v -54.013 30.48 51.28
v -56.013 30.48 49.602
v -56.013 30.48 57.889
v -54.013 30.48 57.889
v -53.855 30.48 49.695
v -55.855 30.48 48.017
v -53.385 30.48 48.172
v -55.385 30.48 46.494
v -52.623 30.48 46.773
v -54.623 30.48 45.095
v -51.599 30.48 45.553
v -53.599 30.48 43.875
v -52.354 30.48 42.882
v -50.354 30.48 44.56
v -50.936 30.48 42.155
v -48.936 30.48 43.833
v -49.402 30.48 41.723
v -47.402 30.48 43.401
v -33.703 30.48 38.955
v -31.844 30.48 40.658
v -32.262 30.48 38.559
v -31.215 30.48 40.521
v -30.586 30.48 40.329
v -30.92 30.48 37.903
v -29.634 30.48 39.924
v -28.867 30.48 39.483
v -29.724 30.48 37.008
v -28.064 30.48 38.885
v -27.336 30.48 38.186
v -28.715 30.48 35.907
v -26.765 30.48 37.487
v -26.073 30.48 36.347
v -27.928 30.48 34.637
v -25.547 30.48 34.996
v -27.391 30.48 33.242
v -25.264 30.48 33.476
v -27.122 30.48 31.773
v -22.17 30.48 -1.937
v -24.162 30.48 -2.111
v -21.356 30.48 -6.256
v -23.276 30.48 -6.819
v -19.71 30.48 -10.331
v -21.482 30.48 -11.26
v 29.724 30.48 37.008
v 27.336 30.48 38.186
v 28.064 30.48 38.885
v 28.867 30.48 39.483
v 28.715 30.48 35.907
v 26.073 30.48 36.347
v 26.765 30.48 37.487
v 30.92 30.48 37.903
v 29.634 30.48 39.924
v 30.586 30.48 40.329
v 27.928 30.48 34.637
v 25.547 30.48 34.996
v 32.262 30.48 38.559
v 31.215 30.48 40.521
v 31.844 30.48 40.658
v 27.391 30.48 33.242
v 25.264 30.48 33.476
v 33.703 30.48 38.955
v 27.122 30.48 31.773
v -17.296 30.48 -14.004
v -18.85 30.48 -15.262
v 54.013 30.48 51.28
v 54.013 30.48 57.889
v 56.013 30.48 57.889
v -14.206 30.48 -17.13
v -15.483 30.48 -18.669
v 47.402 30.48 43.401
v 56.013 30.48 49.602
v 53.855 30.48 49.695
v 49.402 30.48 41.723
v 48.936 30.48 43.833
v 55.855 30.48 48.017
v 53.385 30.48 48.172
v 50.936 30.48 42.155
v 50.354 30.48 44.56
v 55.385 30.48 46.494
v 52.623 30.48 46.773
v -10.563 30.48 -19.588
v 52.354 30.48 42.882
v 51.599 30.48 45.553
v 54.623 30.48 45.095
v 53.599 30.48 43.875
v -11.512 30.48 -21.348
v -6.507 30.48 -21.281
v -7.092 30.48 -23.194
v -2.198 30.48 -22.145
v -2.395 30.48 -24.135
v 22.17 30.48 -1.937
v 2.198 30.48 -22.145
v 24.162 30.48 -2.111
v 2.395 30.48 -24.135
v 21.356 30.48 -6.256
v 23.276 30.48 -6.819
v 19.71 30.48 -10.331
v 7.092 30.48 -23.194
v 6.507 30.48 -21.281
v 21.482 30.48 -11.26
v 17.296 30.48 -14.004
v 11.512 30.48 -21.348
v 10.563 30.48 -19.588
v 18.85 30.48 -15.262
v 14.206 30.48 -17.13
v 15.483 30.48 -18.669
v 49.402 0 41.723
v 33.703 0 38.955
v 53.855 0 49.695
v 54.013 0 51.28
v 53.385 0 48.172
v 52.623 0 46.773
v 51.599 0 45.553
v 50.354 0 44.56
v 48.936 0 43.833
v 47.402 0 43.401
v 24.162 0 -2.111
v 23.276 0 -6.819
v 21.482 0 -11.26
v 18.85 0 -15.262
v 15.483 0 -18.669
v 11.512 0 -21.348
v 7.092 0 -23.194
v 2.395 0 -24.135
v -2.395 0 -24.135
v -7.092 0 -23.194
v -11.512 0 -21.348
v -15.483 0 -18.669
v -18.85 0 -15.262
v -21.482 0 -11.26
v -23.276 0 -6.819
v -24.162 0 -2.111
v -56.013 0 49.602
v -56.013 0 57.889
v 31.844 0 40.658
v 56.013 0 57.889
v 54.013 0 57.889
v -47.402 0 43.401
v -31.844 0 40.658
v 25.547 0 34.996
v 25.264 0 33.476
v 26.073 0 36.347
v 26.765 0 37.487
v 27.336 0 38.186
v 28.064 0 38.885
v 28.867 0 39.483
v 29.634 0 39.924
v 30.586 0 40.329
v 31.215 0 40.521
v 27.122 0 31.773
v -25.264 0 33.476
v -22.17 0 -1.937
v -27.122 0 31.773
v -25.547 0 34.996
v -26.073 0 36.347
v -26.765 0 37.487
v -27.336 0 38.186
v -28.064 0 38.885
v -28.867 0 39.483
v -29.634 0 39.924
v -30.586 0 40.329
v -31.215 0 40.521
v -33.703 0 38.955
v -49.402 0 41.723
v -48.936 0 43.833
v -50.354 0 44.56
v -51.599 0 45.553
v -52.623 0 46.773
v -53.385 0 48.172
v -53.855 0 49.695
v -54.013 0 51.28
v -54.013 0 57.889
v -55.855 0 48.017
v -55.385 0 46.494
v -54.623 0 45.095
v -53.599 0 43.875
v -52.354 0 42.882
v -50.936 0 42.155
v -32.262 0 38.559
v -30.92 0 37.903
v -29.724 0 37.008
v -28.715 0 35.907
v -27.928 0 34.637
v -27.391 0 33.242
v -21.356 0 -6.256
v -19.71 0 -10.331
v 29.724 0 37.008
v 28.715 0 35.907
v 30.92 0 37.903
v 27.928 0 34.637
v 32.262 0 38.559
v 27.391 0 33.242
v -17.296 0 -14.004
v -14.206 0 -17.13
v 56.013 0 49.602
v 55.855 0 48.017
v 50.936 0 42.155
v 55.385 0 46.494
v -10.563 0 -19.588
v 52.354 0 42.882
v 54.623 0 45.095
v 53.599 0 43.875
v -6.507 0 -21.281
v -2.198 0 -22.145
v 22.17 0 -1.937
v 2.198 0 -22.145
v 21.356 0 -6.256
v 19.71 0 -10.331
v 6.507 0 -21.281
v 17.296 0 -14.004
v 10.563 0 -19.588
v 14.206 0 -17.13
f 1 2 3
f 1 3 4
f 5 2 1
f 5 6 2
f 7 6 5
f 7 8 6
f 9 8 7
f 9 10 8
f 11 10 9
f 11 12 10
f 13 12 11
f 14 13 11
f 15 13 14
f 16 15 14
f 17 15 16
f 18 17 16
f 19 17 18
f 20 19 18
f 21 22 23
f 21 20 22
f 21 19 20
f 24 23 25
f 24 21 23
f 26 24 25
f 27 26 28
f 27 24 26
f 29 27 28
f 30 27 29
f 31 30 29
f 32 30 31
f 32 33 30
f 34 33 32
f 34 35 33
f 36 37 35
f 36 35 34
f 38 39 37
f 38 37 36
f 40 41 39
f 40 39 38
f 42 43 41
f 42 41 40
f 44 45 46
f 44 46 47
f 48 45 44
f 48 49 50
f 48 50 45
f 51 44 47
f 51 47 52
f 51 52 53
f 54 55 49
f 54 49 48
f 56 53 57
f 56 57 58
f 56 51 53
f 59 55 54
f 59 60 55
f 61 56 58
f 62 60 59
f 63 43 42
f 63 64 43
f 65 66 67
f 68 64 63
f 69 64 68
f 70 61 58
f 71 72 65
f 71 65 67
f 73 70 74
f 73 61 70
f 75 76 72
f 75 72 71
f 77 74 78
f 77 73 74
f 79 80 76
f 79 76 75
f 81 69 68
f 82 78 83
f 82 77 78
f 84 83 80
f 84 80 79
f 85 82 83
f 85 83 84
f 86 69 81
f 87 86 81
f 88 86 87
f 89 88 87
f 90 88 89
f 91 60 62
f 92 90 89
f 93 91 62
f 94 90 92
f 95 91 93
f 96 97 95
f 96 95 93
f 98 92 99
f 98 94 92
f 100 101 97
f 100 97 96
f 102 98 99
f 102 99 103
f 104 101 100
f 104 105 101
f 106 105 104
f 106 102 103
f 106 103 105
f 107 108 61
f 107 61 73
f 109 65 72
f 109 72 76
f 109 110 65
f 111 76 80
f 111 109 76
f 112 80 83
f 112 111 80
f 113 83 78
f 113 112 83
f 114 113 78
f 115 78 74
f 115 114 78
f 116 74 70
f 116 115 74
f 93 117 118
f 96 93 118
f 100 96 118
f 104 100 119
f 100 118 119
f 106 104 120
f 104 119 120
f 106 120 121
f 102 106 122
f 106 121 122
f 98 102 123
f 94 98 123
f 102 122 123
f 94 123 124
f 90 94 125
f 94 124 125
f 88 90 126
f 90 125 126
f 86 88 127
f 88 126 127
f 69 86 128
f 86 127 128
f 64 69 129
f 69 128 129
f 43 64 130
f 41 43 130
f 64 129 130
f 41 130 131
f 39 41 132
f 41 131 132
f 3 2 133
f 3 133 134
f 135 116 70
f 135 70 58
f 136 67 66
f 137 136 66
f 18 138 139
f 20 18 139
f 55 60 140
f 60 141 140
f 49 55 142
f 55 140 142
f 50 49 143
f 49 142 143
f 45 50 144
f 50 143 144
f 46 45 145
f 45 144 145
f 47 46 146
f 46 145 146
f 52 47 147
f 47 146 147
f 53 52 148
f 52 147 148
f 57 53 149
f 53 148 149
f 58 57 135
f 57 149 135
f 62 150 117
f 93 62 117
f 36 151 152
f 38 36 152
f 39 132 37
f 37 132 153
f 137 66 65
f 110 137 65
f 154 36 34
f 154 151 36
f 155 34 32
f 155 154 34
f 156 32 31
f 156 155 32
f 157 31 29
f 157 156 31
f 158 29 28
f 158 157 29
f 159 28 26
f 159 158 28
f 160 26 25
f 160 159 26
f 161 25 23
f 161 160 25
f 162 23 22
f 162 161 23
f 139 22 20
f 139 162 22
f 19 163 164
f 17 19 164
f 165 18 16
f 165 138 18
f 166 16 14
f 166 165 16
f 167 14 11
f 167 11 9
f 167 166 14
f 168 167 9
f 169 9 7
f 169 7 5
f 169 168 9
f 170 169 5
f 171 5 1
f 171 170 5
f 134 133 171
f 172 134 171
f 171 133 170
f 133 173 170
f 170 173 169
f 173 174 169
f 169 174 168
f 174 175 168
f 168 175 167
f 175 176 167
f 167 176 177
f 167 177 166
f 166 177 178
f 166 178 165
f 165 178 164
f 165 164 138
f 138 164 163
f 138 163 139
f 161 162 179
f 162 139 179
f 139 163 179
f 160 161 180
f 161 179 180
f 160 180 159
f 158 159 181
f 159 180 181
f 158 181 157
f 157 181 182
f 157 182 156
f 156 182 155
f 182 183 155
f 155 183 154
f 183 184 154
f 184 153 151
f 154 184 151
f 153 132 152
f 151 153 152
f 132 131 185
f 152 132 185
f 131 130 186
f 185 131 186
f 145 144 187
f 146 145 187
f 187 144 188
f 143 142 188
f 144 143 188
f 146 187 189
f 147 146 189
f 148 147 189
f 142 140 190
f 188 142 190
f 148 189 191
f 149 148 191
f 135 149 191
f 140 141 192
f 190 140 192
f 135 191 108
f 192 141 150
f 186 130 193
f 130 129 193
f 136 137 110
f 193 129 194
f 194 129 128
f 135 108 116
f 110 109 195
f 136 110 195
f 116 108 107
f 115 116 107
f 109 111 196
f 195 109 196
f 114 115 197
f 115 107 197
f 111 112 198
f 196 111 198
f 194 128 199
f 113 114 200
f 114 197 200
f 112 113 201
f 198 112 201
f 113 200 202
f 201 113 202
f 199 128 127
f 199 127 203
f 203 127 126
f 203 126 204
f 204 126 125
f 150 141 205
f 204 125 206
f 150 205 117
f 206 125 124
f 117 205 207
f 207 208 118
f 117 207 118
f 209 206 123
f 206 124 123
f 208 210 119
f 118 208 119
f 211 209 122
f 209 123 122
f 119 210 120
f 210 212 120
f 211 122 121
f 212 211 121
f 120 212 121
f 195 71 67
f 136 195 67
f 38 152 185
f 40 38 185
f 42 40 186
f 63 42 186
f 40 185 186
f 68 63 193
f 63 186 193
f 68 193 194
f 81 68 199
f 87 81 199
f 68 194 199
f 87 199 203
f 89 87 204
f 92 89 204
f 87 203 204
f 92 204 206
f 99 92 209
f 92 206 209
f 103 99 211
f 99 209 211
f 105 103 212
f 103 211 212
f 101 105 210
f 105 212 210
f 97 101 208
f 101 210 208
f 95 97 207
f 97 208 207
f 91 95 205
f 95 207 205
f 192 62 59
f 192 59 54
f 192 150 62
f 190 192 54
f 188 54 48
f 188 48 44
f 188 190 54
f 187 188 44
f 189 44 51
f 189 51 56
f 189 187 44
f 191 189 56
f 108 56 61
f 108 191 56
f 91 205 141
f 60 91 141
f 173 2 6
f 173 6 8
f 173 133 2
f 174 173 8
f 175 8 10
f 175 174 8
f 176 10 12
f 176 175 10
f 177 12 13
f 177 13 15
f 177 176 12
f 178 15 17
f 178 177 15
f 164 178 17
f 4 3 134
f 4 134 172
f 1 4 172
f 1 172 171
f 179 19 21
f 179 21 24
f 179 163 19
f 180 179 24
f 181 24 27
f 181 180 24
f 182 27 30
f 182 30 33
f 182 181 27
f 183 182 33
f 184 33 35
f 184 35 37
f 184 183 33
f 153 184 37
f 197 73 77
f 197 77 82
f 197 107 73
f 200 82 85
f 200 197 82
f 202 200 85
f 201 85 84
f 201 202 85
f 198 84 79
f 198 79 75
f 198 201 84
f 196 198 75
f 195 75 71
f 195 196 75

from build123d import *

# Parameters (mm, degrees)
BOSS_EXTRUDE2_DEPTH = 30.48
BOSS_EXTRUDE3_DEPTH = 30.48
CUT_EXTRUDE2_DEPTH  = 87.125730482
FILLET1_R           = 8


with BuildPart() as part:
    # Sketch1 → Boss-Extrude2 (new body)
    with BuildSketch(Plane(origin=(0, 0, 0), x_dir=(1, 0, 0), z_dir=(0, 1, 0))):
        with BuildLine():
            ThreePointArc((-22.169540289, 1.937007843), (0, 22.254), (22.169540289, 1.937007843))
            Line((22.169540289, 1.937007843), (27.396679476, -57.888910388))
            Line((27.396679476, -57.888910388), (29.404298913, -57.888910388))
            Line((29.404298913, -57.888910388), (24.161949769, 2.111089612))
            ThreePointArc((24.161949769, 2.111089612), (0, 24.254), (-24.161949769, 2.111089612))
            Line((-24.161949769, 2.111089612), (-29.404298913, -57.888910388))
            Line((-29.404298913, -57.888910388), (-27.396679476, -57.888910388))
            Line((-27.396679476, -57.888910388), (-22.169540289, 1.937007843))
        make_face()
    extrude(amount=BOSS_EXTRUDE2_DEPTH)

    # Sketch2 → Boss-Extrude3 (add)
    with BuildSketch(Plane(origin=(0, 30.48, 0), x_dir=(1, 0, 0), z_dir=(0, 1, 0))):
        Polygon((-27.656849199, -37.888910388), (-56.013258297, -42.888910388), (-56.013258297, -57.888910388), (-54.013258297, -57.888910388), (-54.013258297, -44.567109651), (-27.837066341, -39.951540757), align=None)
        Polygon((54.013258297, -44.567109651), (27.837066341, -39.951540757), (27.656849199, -37.888910388), (56.013258297, -42.888910388), (56.013258297, -57.888910388), (54.013258297, -57.888910388), align=None)
    extrude(amount=-BOSS_EXTRUDE3_DEPTH)

    # Sketch5 → Cut-Extrude2 (cut, through all)
    with BuildSketch(Plane(origin=(0, 30.48, 0), x_dir=(1, 0, 0), z_dir=(0, 1, 0))):
        Polygon((0, -35.043114897), (-25.798033303, -39.592004218), (-27.396679476, -57.888910388), (27.396679476, -57.888910388), (25.798033303, -39.592004218), align=None)
        Polygon((-25.798033303, -39.592004218), (-27.837066341, -39.951540757), (-29.404298913, -57.888910388), (-27.396679476, -57.888910388), align=None)
        Polygon((27.837066341, -39.951540757), (25.798033303, -39.592004218), (27.396679476, -57.888910388), (29.404298913, -57.888910388), align=None)
    extrude(amount=-CUT_EXTRUDE2_DEPTH, mode=Mode.SUBTRACT)

    # Fillet1
    fillet1_edges = [part.edges().sort_by_distance(p)[0] for p in [
        (-27.656849199, 15.24, 37.888910388),
        (-54.013258297, 15.24, 44.567109651),
        (-56.013258297, 15.24, 42.888910388),
        (54.013258297, 15.24, 44.567109651),
        (27.656849199, 15.24, 37.888910388),
        (56.013258297, 15.24, 42.888910388),
        (-25.798033303, 15.24, 39.592004218),
        (25.798033303, 15.24, 39.592004218),
    ]]
    fillet(fillet1_edges, radius=FILLET1_R)


solid = part.part
